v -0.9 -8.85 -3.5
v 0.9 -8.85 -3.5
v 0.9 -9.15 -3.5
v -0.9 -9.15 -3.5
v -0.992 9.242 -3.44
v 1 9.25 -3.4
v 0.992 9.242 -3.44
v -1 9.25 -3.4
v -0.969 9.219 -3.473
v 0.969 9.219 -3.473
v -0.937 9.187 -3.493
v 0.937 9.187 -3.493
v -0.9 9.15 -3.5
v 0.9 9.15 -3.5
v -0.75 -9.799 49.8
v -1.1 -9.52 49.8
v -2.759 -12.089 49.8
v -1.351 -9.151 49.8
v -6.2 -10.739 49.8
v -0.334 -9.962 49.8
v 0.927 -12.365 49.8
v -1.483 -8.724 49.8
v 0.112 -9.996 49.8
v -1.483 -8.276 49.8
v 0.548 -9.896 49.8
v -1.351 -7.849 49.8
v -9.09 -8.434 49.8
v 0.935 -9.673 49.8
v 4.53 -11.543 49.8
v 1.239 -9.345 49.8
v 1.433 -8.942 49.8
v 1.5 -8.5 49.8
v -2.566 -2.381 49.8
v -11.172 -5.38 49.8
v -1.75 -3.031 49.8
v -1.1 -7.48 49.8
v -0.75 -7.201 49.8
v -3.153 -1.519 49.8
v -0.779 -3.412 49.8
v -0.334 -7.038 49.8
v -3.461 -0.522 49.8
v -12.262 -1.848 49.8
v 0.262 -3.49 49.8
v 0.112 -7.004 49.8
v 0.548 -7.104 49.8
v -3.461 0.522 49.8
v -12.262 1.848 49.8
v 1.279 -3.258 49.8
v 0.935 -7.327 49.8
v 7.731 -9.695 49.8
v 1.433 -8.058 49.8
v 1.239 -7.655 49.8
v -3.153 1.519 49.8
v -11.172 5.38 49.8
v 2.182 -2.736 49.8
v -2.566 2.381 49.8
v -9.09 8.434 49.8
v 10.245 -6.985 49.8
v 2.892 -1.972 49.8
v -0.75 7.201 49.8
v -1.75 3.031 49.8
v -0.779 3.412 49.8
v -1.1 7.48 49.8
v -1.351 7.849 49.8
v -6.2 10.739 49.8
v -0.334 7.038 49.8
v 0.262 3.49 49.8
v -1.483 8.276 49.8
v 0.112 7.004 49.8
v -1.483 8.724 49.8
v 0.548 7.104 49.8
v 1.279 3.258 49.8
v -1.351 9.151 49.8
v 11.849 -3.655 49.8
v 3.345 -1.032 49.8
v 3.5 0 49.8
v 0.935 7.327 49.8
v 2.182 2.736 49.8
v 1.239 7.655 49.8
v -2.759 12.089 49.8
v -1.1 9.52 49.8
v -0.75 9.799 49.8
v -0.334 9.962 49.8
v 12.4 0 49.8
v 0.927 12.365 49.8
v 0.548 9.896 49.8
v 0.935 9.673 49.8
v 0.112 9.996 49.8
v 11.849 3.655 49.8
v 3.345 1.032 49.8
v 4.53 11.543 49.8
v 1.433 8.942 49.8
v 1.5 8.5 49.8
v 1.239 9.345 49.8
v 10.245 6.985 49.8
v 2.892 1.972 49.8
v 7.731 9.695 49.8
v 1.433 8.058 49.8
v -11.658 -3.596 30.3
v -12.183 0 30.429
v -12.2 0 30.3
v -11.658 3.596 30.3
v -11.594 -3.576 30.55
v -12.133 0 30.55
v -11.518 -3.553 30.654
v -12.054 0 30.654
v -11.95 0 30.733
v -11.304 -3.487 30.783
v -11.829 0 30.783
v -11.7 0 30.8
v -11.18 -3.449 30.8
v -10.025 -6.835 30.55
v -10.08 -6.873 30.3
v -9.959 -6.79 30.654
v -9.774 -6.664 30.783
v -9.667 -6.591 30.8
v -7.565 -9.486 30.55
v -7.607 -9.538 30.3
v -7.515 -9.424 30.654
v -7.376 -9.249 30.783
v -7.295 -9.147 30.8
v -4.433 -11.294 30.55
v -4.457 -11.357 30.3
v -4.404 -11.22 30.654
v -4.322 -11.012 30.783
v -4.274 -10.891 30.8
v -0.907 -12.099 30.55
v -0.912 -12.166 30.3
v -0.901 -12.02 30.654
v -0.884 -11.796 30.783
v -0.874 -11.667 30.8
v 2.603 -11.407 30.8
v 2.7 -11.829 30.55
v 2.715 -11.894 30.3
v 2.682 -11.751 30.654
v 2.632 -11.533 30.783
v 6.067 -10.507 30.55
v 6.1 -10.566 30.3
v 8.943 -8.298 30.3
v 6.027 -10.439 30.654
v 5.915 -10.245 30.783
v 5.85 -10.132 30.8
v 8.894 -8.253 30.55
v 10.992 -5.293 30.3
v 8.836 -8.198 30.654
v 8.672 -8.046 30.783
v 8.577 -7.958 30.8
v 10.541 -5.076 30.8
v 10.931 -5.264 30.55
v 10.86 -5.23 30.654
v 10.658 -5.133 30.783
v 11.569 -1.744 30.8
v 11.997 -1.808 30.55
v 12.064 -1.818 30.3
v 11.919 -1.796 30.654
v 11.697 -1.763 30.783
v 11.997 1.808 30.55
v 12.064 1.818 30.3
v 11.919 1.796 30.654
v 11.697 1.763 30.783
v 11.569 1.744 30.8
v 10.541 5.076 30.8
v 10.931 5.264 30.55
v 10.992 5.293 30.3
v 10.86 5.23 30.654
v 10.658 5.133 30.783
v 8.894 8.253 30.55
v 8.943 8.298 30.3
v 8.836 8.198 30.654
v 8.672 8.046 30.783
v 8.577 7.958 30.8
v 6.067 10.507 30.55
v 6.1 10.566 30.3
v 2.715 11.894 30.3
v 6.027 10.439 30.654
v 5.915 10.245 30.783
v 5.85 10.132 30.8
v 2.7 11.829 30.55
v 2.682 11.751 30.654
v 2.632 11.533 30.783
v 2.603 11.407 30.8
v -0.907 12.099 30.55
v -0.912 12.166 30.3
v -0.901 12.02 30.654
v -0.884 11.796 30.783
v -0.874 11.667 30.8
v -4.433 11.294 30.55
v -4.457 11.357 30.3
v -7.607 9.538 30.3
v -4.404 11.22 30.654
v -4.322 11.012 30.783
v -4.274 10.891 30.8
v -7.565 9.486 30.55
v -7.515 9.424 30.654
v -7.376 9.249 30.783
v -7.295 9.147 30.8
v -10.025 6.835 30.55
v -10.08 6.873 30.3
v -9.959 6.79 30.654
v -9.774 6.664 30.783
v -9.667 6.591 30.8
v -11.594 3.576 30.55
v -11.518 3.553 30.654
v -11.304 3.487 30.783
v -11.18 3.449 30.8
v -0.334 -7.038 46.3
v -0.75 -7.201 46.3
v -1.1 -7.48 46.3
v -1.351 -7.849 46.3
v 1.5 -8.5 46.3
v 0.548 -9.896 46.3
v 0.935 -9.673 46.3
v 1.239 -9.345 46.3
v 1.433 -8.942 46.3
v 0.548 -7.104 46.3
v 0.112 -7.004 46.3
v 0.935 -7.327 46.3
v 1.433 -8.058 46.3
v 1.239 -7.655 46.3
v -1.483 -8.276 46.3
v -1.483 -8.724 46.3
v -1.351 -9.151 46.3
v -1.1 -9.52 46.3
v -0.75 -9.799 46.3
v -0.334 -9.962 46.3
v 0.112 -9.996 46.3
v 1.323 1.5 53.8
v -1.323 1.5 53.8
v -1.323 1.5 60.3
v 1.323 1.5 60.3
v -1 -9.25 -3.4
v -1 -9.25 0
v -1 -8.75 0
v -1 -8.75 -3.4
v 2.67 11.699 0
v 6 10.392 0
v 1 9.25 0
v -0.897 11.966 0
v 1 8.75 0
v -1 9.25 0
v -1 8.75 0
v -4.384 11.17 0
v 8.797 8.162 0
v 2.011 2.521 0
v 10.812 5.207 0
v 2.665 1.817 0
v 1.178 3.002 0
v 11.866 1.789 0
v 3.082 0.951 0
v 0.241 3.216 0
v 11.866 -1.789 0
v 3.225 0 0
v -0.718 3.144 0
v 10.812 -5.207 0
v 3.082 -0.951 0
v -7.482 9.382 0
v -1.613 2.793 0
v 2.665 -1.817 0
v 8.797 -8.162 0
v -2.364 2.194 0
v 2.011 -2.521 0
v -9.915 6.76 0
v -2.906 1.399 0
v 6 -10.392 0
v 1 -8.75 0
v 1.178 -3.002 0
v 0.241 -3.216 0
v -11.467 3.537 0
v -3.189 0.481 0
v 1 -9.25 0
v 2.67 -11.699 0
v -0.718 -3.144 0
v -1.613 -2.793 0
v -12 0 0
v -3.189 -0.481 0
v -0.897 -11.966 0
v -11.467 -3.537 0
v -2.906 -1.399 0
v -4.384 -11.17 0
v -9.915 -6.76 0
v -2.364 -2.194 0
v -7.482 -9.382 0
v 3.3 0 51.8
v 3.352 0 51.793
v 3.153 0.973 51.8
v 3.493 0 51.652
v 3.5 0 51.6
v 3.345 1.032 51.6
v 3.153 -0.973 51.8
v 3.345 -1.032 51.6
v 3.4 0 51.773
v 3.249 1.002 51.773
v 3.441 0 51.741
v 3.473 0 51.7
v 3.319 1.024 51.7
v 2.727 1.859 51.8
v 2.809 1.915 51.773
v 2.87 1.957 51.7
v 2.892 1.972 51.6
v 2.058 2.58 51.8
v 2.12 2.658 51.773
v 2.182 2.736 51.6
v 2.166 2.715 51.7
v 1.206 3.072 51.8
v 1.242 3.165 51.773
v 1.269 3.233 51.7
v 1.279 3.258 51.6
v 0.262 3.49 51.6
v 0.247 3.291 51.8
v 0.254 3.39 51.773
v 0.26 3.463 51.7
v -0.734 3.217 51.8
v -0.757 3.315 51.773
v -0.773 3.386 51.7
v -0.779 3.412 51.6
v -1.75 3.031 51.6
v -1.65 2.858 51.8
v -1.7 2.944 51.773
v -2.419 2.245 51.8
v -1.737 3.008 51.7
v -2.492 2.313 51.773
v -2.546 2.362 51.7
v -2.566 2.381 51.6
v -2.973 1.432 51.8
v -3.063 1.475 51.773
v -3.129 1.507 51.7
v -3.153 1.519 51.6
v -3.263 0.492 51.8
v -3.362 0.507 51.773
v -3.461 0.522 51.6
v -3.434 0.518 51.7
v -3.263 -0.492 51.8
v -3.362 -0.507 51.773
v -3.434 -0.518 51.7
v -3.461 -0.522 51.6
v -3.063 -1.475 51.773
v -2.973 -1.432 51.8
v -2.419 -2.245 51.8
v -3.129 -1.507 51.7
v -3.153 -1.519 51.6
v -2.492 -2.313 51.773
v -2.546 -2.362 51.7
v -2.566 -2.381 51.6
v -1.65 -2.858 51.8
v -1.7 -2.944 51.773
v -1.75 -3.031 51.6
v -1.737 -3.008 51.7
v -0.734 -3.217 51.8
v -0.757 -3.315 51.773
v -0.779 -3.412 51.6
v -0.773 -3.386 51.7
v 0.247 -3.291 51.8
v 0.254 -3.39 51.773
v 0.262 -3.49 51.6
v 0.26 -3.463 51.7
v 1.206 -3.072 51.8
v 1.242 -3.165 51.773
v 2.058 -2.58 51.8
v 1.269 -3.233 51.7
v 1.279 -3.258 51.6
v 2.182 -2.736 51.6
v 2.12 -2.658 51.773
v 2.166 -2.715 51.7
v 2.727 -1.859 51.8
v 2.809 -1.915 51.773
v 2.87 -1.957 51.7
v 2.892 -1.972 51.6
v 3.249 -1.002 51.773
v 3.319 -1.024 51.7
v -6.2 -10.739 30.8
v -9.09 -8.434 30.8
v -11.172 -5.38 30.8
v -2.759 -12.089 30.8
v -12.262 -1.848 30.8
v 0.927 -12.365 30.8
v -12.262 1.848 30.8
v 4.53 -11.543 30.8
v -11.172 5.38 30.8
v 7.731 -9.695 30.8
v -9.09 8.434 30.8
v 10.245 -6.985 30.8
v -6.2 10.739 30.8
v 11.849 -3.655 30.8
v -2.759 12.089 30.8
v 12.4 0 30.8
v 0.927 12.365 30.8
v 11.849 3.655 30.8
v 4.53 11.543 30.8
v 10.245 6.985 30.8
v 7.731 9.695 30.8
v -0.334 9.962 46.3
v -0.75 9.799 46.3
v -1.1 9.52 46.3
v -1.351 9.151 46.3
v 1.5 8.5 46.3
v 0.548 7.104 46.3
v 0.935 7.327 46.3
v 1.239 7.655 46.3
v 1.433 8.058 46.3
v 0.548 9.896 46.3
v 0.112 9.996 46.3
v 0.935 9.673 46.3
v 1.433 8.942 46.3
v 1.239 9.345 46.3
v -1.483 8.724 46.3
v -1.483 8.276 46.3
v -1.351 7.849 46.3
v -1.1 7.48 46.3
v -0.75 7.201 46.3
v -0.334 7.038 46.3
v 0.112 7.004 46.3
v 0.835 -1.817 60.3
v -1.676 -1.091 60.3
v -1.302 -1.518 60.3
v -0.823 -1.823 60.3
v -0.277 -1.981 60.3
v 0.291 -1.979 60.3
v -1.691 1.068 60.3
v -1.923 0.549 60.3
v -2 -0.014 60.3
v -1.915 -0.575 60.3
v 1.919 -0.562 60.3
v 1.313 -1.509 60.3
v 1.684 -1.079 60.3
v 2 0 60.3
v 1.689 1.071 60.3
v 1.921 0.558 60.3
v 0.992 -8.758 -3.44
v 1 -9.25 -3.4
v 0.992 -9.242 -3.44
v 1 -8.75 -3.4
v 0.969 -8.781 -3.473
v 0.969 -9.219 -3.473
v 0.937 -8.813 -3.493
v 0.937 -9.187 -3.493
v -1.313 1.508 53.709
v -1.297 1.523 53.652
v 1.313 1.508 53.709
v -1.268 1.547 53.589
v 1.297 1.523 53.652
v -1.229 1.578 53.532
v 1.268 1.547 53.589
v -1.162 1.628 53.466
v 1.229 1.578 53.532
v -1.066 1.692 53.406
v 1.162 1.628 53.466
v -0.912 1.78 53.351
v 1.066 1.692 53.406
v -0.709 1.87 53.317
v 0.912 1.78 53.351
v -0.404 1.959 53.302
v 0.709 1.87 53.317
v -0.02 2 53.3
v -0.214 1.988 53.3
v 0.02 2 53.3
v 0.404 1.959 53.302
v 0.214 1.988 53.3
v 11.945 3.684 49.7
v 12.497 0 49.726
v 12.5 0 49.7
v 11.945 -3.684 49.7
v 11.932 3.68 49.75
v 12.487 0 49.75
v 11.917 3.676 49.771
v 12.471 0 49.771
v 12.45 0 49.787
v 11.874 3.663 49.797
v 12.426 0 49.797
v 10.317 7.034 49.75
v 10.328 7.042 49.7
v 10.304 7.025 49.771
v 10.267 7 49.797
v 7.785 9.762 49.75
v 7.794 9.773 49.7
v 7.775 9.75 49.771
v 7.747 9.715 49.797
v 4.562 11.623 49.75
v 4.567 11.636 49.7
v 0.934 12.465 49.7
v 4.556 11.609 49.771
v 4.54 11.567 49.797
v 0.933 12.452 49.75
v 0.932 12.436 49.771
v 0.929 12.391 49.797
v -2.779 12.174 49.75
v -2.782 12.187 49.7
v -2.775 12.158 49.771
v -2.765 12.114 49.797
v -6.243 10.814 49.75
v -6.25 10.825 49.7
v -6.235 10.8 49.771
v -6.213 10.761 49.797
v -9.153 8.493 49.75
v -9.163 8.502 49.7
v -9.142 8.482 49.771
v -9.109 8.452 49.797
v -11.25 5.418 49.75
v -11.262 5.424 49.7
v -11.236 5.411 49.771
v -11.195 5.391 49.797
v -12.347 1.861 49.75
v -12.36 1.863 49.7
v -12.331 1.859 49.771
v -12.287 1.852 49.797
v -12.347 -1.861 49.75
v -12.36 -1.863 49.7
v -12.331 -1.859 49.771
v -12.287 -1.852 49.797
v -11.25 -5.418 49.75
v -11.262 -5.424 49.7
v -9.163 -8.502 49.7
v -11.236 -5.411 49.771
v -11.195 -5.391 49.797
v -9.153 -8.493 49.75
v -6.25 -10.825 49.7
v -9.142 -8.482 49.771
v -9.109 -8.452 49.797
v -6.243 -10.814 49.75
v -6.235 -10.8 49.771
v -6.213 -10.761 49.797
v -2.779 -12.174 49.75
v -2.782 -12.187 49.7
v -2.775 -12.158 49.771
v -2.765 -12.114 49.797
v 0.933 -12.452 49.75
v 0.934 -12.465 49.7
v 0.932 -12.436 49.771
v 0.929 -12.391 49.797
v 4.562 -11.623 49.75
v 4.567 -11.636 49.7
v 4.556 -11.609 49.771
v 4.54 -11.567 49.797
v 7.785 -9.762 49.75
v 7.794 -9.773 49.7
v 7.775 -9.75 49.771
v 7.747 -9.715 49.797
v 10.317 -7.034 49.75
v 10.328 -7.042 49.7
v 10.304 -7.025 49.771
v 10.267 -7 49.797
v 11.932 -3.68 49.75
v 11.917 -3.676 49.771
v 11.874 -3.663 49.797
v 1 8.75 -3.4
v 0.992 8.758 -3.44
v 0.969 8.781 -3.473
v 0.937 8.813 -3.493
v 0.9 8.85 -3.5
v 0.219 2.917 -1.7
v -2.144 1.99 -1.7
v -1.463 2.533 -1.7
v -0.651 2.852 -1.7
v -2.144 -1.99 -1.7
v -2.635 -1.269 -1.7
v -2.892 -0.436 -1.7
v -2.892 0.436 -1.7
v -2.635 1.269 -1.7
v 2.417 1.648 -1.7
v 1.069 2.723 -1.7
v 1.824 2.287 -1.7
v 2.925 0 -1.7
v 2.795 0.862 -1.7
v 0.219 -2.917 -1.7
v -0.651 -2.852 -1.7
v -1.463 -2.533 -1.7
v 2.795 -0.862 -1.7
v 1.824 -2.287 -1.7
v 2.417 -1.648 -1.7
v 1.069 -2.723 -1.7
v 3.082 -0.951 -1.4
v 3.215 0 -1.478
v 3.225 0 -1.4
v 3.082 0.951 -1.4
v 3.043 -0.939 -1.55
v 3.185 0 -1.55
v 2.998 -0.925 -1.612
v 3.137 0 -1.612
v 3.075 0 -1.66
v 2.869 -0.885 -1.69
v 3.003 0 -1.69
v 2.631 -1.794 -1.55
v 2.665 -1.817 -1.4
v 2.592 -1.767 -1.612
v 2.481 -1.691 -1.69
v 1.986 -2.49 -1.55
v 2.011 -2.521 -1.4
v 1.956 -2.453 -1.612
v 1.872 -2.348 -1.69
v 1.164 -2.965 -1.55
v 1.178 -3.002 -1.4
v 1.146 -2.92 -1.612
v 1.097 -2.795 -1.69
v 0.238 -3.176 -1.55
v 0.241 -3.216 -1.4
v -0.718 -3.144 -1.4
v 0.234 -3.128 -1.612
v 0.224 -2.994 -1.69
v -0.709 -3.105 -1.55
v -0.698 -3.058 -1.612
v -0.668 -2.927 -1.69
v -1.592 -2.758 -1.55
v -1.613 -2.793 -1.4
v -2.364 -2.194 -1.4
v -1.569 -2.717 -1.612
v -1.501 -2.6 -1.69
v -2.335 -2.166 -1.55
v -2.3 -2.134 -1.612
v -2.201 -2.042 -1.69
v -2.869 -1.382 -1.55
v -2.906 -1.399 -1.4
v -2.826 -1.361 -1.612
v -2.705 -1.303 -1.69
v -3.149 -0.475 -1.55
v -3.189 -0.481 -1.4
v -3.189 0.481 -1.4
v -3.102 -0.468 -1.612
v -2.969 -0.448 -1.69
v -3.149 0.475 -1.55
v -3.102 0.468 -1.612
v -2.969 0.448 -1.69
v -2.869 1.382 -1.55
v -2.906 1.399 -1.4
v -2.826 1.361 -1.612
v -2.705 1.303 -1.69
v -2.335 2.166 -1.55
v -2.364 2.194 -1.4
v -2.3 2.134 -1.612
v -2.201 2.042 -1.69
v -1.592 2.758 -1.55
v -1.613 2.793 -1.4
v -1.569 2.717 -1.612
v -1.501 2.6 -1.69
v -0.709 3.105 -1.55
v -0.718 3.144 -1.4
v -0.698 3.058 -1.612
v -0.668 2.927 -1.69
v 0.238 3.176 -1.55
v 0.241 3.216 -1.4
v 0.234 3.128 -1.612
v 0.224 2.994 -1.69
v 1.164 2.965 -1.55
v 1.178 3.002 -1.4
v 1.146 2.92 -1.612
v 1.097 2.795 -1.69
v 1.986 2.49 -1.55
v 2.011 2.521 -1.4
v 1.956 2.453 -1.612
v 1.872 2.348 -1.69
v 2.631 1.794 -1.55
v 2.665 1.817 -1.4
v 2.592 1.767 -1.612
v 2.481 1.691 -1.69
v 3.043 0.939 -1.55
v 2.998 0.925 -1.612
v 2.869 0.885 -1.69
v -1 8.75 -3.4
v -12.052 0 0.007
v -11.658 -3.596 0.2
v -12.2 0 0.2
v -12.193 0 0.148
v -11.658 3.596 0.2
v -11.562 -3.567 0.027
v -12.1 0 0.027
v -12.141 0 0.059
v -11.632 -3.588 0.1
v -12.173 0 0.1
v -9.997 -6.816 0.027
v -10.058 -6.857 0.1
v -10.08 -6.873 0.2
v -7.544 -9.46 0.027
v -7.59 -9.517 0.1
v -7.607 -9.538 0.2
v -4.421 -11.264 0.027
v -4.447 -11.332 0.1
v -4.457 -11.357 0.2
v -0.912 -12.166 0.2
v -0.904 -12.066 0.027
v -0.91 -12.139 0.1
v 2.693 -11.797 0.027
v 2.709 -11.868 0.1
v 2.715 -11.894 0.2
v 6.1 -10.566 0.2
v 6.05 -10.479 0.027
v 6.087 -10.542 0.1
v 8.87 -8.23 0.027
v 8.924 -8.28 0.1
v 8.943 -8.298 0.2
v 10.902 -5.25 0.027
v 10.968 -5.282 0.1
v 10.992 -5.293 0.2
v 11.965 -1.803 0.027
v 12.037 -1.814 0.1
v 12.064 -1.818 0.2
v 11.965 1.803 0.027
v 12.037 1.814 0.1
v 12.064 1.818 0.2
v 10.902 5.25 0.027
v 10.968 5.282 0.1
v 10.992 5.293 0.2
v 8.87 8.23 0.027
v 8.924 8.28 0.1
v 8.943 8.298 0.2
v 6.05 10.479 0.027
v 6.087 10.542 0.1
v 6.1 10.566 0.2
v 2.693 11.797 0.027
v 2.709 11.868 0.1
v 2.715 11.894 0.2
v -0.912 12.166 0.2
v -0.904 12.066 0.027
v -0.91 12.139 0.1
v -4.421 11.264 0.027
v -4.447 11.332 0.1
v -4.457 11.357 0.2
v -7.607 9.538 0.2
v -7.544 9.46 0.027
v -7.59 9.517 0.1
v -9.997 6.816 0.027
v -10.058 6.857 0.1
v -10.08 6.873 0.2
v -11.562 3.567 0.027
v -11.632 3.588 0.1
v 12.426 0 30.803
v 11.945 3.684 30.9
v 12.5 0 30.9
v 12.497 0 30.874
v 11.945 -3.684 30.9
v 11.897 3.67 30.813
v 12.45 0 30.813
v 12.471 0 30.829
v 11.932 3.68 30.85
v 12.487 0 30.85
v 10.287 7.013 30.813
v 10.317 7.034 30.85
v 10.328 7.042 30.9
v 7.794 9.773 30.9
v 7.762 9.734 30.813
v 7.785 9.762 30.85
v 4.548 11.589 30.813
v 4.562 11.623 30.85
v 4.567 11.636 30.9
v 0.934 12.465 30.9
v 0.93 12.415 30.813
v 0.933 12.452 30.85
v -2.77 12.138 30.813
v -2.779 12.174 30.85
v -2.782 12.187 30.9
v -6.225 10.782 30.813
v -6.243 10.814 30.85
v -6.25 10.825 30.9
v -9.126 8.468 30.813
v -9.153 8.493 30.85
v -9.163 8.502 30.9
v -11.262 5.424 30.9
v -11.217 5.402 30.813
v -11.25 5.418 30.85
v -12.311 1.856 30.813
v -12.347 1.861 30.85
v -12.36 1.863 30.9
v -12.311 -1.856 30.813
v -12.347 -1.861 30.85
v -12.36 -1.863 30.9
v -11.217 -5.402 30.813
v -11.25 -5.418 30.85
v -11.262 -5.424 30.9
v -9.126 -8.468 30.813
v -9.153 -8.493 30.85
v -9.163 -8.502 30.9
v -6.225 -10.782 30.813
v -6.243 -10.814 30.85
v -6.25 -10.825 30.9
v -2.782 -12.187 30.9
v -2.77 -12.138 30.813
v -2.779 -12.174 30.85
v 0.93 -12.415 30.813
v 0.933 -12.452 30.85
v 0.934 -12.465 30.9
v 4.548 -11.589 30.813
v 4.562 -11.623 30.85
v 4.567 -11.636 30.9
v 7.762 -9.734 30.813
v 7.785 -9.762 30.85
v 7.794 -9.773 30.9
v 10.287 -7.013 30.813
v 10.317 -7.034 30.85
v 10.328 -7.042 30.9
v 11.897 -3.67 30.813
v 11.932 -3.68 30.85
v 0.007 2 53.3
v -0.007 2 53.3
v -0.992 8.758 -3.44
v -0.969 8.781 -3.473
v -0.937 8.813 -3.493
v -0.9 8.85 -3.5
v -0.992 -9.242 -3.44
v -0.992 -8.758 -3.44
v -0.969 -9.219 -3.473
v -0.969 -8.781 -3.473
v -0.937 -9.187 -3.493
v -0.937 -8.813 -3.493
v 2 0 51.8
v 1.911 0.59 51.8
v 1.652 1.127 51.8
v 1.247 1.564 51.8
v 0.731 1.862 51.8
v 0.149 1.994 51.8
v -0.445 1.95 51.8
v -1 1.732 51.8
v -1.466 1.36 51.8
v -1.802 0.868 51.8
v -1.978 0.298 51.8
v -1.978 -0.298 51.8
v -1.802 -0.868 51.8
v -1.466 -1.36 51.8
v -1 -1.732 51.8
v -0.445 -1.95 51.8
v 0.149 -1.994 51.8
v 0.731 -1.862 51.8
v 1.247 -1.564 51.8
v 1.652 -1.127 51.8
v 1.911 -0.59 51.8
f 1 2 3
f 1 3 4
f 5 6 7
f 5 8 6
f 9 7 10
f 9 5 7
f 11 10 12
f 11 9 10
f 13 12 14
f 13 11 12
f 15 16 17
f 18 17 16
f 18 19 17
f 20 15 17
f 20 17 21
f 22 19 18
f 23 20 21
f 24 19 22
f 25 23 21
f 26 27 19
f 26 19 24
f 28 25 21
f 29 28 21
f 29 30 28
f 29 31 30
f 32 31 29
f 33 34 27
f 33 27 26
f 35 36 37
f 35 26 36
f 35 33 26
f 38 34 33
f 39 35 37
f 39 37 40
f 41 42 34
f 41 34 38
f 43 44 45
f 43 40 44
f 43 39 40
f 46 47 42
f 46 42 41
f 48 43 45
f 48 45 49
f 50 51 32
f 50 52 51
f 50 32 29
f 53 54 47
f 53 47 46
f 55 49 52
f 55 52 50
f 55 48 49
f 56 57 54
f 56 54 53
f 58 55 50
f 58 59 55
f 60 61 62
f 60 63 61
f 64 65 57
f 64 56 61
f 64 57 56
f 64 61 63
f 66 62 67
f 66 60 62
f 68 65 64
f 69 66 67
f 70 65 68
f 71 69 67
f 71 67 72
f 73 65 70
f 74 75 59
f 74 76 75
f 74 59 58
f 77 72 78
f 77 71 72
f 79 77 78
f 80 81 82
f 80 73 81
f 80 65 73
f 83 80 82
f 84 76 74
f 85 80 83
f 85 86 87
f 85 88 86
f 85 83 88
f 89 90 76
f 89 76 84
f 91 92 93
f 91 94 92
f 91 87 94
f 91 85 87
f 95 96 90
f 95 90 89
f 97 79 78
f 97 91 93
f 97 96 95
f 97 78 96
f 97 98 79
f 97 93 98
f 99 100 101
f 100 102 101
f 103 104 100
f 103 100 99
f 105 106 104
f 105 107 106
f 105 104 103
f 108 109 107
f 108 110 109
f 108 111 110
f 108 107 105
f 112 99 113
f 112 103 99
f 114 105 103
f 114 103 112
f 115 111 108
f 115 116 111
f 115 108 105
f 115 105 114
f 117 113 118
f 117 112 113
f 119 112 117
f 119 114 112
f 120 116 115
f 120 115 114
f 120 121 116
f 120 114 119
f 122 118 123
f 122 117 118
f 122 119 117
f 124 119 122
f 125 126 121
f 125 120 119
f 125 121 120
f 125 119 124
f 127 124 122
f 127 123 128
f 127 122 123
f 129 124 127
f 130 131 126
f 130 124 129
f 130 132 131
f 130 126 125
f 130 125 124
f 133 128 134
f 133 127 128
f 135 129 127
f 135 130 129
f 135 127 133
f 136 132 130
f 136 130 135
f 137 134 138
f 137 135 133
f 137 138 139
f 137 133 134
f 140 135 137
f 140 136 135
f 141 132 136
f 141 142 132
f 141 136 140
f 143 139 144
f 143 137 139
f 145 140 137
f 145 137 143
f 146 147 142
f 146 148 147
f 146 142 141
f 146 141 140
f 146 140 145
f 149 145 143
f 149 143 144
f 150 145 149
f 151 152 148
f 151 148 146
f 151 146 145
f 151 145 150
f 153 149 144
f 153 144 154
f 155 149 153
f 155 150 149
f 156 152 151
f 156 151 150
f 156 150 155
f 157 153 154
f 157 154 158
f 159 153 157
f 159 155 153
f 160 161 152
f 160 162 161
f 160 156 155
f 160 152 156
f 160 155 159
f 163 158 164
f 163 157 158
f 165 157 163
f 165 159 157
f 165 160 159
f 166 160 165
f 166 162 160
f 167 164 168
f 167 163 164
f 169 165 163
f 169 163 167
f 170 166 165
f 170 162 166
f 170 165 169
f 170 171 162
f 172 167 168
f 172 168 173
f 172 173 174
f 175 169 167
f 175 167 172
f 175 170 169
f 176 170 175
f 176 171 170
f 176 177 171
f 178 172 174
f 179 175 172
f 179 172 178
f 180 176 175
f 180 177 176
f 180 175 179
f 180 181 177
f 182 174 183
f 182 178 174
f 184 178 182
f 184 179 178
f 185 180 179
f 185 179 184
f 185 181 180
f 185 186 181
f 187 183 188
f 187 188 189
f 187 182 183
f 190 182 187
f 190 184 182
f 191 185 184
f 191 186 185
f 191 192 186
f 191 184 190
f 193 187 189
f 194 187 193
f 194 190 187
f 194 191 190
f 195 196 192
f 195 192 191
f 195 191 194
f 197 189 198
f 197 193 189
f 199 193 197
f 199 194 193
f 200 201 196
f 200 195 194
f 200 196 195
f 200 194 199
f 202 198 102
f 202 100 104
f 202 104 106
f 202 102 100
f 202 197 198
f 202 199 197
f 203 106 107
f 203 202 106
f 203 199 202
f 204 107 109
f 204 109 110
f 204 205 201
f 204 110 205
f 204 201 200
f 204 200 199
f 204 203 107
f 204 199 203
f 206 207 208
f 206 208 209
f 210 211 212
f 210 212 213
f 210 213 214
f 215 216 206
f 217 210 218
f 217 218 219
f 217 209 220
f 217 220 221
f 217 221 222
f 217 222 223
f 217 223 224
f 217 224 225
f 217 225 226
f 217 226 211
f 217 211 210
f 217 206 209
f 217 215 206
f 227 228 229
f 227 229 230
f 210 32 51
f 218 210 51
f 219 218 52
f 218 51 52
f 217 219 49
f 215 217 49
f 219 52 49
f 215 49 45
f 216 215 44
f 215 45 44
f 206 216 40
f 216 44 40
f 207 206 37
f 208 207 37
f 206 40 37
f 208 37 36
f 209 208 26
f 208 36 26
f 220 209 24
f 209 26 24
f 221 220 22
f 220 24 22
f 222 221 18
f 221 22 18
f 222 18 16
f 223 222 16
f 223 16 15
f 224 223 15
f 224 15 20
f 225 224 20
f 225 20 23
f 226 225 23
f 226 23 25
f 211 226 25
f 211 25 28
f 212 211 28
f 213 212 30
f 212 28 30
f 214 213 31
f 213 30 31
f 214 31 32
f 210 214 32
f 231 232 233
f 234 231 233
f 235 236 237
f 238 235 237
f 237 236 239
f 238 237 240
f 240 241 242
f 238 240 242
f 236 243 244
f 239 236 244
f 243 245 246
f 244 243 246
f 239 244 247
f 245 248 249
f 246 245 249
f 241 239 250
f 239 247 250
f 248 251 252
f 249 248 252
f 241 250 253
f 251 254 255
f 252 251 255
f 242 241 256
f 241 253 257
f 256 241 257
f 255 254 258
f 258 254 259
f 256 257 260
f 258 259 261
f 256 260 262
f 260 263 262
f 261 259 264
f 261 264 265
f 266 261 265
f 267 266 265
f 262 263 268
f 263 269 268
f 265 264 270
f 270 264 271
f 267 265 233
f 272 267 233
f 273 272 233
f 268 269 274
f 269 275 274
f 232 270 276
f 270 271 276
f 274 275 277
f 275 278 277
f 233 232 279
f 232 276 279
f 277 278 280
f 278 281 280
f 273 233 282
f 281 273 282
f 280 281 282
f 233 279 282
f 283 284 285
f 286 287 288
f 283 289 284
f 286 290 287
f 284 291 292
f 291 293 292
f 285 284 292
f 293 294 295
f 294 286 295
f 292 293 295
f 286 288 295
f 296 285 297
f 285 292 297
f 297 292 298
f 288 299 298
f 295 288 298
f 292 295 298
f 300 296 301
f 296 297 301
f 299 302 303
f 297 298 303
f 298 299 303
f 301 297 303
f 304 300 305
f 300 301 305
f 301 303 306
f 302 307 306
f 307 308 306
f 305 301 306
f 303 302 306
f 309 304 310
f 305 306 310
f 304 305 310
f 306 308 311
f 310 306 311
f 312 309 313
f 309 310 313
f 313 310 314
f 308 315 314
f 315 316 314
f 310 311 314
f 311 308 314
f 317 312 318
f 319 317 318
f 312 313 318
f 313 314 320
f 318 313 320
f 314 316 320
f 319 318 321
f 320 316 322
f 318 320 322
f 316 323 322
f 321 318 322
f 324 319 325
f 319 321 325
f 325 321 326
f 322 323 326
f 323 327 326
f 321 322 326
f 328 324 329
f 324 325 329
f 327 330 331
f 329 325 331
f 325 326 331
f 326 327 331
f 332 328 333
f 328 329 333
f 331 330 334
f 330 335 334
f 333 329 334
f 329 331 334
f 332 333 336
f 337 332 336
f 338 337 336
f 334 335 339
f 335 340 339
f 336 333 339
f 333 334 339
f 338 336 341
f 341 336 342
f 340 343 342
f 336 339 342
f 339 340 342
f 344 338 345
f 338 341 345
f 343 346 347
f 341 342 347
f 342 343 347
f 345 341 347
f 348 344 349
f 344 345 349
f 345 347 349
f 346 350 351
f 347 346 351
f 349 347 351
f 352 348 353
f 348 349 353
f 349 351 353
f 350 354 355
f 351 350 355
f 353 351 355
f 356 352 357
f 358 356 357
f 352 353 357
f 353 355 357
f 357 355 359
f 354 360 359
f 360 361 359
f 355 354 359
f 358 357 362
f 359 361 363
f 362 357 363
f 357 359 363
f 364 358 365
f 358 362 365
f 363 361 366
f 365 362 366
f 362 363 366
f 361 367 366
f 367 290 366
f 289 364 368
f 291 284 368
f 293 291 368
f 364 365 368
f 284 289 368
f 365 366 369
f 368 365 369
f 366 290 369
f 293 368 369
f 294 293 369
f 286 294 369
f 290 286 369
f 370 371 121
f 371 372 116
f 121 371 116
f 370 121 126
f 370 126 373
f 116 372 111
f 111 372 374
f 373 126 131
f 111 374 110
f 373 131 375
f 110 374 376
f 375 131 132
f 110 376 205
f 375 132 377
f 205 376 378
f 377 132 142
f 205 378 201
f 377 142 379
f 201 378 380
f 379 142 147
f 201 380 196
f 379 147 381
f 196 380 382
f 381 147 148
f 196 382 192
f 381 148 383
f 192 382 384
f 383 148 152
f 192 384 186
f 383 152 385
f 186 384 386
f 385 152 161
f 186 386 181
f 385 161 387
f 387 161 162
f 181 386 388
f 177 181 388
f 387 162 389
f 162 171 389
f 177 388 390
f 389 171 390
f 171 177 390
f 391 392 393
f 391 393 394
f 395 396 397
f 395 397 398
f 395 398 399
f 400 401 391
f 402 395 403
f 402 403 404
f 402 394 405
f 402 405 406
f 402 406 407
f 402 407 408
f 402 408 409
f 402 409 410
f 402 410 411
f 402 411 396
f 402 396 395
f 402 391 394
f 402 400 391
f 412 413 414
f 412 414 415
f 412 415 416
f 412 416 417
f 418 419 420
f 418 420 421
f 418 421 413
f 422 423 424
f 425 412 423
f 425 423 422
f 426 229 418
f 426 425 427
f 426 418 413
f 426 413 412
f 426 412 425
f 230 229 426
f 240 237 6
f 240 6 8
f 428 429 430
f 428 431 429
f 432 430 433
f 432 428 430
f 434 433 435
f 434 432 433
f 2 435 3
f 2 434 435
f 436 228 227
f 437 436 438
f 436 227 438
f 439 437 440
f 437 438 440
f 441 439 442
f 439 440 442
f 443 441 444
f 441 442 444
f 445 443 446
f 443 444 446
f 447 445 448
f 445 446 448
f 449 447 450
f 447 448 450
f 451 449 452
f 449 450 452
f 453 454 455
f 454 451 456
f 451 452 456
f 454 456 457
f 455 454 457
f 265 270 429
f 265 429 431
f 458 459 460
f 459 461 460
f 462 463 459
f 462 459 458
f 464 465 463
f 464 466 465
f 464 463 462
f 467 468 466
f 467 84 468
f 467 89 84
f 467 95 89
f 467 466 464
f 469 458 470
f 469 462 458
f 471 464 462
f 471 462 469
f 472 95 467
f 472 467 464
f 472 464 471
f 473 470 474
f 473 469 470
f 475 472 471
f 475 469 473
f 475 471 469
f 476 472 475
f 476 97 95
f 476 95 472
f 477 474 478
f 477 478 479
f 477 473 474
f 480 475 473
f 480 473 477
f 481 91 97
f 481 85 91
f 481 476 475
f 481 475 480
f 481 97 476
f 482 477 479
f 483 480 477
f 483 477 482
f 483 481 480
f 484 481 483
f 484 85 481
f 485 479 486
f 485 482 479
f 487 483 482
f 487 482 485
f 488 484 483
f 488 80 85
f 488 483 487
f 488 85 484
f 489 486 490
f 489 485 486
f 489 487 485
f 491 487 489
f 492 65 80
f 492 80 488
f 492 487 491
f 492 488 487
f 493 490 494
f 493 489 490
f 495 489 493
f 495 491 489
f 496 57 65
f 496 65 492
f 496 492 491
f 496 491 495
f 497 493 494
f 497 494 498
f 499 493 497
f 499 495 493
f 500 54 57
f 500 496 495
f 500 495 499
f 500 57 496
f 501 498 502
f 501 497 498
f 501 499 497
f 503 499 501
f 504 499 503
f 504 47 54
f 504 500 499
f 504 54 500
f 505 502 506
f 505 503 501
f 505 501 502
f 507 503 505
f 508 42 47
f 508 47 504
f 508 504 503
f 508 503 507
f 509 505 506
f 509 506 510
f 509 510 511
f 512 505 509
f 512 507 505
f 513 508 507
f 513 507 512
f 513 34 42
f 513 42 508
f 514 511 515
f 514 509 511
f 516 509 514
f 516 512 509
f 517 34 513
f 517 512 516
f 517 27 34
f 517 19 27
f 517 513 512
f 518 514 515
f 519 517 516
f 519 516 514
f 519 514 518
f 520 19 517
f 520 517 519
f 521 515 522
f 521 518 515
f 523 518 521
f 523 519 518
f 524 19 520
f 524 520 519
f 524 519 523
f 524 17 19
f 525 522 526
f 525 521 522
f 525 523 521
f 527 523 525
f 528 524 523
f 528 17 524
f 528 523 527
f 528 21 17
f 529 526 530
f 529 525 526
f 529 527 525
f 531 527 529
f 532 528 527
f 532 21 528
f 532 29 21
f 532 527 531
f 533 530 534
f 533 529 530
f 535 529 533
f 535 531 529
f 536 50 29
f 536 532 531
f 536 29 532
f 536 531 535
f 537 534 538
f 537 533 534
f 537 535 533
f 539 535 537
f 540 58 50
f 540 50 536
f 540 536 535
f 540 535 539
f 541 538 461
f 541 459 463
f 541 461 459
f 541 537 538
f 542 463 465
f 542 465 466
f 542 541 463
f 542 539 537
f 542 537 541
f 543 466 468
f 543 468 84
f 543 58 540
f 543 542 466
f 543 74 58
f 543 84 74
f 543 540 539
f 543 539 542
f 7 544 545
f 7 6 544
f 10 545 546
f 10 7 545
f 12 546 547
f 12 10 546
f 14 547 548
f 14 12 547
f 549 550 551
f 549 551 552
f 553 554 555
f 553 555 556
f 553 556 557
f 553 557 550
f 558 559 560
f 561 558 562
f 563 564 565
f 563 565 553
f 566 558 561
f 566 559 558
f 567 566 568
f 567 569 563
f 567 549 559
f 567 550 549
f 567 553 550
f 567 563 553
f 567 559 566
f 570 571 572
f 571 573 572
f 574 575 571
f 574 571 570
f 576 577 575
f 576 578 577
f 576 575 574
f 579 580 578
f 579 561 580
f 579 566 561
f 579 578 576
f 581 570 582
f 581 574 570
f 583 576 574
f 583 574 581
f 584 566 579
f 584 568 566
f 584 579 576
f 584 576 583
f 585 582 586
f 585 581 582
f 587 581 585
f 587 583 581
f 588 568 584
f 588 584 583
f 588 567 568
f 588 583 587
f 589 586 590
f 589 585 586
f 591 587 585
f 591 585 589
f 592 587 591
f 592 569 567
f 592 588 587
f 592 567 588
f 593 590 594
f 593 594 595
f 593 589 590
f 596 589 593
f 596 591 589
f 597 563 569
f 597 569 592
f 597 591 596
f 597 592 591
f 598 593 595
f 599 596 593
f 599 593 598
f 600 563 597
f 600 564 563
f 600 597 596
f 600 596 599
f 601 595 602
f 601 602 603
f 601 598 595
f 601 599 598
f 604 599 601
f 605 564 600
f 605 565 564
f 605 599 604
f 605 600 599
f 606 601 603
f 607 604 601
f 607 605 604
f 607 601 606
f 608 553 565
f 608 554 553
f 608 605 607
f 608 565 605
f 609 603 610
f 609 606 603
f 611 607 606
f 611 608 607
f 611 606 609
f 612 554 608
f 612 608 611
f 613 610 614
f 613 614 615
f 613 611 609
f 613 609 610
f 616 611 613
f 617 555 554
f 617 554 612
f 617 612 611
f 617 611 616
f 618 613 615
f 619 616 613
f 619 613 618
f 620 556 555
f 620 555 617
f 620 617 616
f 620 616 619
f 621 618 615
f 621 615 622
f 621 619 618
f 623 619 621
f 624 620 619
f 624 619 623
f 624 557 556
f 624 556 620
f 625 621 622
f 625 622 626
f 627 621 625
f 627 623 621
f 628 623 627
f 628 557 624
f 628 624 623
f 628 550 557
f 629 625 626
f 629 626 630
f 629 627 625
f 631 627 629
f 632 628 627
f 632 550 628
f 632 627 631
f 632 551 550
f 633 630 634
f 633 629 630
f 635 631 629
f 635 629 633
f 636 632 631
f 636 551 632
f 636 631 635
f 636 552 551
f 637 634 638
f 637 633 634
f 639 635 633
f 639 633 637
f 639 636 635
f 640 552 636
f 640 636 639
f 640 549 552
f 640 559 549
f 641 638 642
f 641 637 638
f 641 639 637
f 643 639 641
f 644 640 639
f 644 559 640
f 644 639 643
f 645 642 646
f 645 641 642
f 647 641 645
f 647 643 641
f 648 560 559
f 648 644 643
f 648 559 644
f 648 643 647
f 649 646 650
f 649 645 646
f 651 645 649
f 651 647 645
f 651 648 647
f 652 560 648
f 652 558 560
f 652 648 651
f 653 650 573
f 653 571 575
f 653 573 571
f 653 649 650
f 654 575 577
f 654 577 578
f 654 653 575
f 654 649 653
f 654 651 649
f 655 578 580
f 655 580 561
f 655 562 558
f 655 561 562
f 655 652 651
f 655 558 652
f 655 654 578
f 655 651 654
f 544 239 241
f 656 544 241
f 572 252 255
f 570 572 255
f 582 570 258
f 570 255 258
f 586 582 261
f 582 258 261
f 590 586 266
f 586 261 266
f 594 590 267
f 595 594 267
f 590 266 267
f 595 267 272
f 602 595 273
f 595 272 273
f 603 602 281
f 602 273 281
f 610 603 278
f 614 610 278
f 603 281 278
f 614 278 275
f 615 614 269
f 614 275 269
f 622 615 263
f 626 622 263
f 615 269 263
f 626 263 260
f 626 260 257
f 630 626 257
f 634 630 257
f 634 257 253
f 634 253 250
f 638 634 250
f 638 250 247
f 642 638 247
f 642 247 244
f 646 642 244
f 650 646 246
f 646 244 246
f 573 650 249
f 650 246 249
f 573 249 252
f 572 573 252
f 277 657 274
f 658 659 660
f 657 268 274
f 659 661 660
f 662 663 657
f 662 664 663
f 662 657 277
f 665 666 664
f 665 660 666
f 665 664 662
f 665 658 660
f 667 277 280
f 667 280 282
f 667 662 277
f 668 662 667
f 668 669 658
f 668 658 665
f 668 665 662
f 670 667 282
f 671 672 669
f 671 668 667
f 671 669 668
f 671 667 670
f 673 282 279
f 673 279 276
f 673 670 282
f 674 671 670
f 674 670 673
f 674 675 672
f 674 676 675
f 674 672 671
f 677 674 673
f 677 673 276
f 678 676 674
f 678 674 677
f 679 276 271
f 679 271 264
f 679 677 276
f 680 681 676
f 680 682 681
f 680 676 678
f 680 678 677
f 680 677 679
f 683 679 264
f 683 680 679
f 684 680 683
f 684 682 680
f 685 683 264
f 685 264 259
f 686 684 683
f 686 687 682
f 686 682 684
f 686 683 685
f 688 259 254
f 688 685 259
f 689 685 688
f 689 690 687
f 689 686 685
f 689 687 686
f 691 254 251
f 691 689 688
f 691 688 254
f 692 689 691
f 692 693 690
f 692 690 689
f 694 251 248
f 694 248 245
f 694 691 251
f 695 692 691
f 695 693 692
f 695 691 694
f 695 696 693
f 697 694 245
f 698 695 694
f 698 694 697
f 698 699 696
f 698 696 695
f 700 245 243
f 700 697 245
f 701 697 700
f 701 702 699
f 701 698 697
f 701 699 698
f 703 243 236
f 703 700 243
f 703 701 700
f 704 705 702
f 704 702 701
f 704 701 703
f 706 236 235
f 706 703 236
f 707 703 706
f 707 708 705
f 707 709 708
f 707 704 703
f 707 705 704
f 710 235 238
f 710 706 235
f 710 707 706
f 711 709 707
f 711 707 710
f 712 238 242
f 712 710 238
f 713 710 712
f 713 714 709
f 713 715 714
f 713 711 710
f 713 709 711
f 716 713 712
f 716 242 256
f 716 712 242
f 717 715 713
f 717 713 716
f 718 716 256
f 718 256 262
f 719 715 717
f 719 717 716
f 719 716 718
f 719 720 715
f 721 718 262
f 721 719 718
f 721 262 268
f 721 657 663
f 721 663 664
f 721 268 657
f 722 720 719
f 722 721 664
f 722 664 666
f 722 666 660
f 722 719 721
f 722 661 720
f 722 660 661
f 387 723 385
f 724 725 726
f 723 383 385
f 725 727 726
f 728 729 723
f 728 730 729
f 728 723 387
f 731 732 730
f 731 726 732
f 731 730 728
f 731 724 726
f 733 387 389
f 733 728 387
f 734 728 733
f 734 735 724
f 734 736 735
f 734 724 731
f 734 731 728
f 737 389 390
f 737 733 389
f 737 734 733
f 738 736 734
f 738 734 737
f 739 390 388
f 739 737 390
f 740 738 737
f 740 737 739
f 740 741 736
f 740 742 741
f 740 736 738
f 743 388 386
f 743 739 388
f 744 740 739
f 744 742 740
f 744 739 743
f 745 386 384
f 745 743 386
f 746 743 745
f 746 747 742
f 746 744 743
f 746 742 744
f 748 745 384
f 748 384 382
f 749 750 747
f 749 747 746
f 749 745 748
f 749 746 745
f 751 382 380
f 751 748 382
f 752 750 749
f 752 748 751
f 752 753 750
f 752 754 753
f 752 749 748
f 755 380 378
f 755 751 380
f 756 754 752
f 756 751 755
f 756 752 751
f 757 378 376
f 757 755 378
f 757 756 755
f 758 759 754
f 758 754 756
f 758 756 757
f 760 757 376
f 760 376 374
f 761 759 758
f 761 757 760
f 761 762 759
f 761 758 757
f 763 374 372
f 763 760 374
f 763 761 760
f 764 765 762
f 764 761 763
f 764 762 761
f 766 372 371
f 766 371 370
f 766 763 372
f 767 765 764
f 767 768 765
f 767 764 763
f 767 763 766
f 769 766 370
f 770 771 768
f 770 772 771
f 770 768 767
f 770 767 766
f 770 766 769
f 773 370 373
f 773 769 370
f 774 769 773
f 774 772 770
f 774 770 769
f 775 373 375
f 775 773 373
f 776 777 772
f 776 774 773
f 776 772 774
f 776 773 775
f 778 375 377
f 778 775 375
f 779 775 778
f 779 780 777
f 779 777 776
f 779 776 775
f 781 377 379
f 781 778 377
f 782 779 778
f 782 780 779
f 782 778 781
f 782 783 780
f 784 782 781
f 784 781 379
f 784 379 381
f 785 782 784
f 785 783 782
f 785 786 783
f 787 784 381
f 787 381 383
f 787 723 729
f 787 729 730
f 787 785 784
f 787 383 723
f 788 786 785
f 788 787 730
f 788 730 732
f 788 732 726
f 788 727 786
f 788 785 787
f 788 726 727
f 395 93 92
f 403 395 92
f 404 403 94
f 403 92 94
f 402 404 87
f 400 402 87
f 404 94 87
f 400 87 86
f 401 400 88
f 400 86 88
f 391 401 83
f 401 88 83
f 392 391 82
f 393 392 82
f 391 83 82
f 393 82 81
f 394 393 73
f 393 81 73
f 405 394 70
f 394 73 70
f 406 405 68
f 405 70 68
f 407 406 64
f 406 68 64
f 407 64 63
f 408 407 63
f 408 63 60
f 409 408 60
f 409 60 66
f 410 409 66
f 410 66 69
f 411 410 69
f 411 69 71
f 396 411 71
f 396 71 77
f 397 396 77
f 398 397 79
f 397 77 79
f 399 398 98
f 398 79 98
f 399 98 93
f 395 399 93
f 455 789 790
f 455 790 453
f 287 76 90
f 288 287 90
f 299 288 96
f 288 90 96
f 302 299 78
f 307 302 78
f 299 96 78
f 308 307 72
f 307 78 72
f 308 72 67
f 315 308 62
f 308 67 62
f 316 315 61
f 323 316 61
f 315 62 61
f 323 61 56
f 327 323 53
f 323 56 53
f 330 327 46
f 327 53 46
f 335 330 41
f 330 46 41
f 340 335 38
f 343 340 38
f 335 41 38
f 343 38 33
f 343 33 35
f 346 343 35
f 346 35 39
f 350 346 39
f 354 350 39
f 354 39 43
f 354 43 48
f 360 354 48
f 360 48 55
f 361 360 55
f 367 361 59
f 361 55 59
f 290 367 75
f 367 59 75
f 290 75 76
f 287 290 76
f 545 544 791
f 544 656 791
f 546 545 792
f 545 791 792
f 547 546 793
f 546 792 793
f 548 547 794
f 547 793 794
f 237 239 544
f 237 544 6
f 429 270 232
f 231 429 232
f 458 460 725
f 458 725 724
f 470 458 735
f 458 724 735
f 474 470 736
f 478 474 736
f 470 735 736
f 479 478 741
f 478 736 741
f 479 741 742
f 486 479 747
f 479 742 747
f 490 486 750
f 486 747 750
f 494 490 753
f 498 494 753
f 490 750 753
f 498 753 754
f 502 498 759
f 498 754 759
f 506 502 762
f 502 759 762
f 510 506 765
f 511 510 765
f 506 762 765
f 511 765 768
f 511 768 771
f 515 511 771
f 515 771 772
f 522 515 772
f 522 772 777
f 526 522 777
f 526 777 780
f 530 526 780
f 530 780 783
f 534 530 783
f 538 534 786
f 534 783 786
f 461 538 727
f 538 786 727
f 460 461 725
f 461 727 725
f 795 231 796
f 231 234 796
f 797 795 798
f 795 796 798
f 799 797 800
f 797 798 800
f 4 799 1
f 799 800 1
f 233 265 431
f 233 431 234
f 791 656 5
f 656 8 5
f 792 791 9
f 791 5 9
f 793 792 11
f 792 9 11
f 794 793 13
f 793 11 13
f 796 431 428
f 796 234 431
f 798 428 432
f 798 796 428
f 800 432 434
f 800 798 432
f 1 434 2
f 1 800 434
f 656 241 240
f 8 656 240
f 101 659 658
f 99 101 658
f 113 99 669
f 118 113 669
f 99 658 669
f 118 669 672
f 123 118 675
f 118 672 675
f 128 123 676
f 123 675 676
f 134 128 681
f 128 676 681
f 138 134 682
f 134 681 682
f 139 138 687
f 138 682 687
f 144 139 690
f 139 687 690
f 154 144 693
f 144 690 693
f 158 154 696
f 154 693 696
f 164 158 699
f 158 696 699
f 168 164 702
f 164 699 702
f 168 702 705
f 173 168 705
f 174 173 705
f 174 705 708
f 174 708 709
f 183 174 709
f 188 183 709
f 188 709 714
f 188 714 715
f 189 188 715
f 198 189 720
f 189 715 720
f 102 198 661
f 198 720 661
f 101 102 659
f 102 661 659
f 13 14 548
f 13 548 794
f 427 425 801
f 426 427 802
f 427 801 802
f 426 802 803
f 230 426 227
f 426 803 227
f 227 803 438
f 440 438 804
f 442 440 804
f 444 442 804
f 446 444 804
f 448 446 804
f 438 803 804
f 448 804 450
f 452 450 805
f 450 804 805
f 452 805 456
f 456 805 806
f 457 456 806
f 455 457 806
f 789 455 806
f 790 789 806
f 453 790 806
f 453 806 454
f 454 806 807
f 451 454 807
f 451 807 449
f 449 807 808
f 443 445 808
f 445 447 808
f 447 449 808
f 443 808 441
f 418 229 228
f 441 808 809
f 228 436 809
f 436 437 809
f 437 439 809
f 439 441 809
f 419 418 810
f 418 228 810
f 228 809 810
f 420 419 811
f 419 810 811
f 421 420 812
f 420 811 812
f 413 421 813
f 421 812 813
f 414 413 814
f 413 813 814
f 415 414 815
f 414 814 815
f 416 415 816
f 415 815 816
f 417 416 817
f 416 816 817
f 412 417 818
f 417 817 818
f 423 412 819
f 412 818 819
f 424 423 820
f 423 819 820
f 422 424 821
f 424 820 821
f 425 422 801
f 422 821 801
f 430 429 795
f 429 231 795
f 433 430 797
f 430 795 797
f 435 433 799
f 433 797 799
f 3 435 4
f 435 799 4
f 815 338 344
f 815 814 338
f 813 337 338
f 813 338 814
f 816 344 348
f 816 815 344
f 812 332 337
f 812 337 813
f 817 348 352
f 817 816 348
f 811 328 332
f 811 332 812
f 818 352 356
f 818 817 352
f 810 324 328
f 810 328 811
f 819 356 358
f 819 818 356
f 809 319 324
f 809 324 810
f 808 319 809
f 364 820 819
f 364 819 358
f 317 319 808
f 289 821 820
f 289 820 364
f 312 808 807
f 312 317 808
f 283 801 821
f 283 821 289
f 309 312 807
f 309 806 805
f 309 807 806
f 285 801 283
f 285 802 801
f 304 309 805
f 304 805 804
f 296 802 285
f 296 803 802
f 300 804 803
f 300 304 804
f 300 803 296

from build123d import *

# Parameters (mm, degrees)
IZIM2_R                     = 12.2
Y_KSEKLIK_EKSTR_ZYON1_DEPTH = 30.8
RADYUS1_R                   = 0.5
IZIM3_R                     = 12.5
Y_KSEKLIK_EKSTR_ZYON2_DEPTH = 19
IZIM4_R                     = 3.5
Y_KSEKLIK_EKSTR_ZYON3_DEPTH = 2
IZIM5_R                     = 3.225
Y_KSEKLIK_EKSTR_ZYON4_DEPTH = 1.7
IZIM6_R                     = 2
Y_KSEKLIK_EKSTR_ZYON5_DEPTH = 8.5
KES_EKSTR_ZYON1_START       = -7
KES_EKSTR_ZYON1_DEPTH       = 7
RADYUS2_R                   = 0.5
RADYUS3_R                   = 0.2
RADYUS4_R                   = 0.3
RADYUS5_R                   = 0.2
RADYUS6_R                   = 0.1
RADYUS7_R                   = 0.1
IZIM8_R                     = 1.5
KES_EKSTR_ZYON2_DEPTH       = 3.5
IZIM9_W                     = 2
IZIM9_H                     = 0.5
Y_KSEKLIK_EKSTR_ZYON8_DEPTH = 3.5
RADYUS8_R                   = 0.1


with BuildPart() as part:
    # Çizim2 → Yükseklik-Ekstrüzyon1 (new body)
    with BuildSketch(Plane.XY):
        with Locations(Location((0, 0, 0), (0, 0, 180))):
            Circle(IZIM2_R)
    extrude(amount=Y_KSEKLIK_EKSTR_ZYON1_DEPTH)

    # Radyus1
    radyus1_edges = [part.edges().sort_by_distance(p)[0] for p in [
        (12.2, 0, 30.8),
    ]]
    fillet(radyus1_edges, radius=RADYUS1_R)

    # Çizim3 → Yükseklik-Ekstrüzyon2 (add)
    with BuildSketch(Plane.XY.offset(30.8)):
        Circle(IZIM3_R)
    extrude(amount=Y_KSEKLIK_EKSTR_ZYON2_DEPTH)

    # Çizim4 → Yükseklik-Ekstrüzyon3 (add)
    with BuildSketch(Plane.XY.offset(49.8)):
        Circle(IZIM4_R)
    extrude(amount=Y_KSEKLIK_EKSTR_ZYON3_DEPTH)

    # Çizim5 → Yükseklik-Ekstrüzyon4 (add)
    with BuildSketch(Plane(origin=(0, 0, 0), x_dir=(-1, 0, 0), z_dir=(0, 0, -1))):
        with Locations(Location((0, 0, 0), (0, 0, 180))):
            Circle(IZIM5_R)
    extrude(amount=Y_KSEKLIK_EKSTR_ZYON4_DEPTH)

    # Çizim6 → Yükseklik-Ekstrüzyon5 (add)
    with BuildSketch(Plane.XY.offset(51.8)):
        Circle(IZIM6_R)
    extrude(amount=Y_KSEKLIK_EKSTR_ZYON5_DEPTH)

    # Çizim7 → Kes-Ekstrüzyon1 (cut)
    with BuildSketch(Plane.XY.offset(60.3).offset(KES_EKSTR_ZYON1_START)):
        with BuildLine():
            Line((-1.322875656, 1.5), (1.322875656, 1.5))
            ThreePointArc((1.322875656, 1.5), (0, 2), (-1.322875656, 1.5))
        make_face()
    extrude(amount=KES_EKSTR_ZYON1_DEPTH, mode=Mode.SUBTRACT)

    # Radyus2
    radyus2_edges = [part.edges().sort_by_distance(p)[0] for p in [
        (0, 1.5, 53.3),
    ]]
    fillet(radyus2_edges, radius=RADYUS2_R - 0.0001)  # a hair under: the kernel refuses the full size

    # Radyus3
    radyus3_edges = [part.edges().sort_by_distance(p)[0] for p in [
        (-3.5, 0, 51.8),
    ]]
    fillet(radyus3_edges, radius=RADYUS3_R)

    # Radyus4
    radyus4_edges = [part.edges().sort_by_distance(p)[0] for p in [
        (-3.225, 0, -1.7),
    ]]
    fillet(radyus4_edges, radius=RADYUS4_R)

    # Radyus5
    radyus5_edges = [part.edges().sort_by_distance(p)[0] for p in [
        (12.2, 0, 0),
    ]]
    fillet(radyus5_edges, radius=RADYUS5_R)

    # Radyus6
    radyus6_edges = [part.edges().sort_by_distance(p)[0] for p in [
        (-12.5, 0, 30.8),
    ]]
    fillet(radyus6_edges, radius=RADYUS6_R)

    # Radyus7
    radyus7_edges = [part.edges().sort_by_distance(p)[0] for p in [
        (-12.5, 0, 49.8),
    ]]
    fillet(radyus7_edges, radius=RADYUS7_R)

    # Çizim8 → Kes-Ekstrüzyon2 (cut)
    with BuildSketch(Plane.XY.offset(49.8)):
        with Locations((0, 8.5)):
            Circle(IZIM8_R)
        with Locations((0, -8.5)):
            Circle(IZIM8_R)
    extrude(amount=-KES_EKSTR_ZYON2_DEPTH, mode=Mode.SUBTRACT)

    # Çizim9 → Yükseklik-Ekstrüzyon8 (add)
    with BuildSketch(Plane(origin=(0, 0, 0), x_dir=(-1, 0, 0), z_dir=(0, 0, -1))):
        with Locations((0, 9)):
            Rectangle(IZIM9_W, IZIM9_H)
        with Locations((0, -9)):
            Rectangle(IZIM9_W, IZIM9_H)
    extrude(amount=Y_KSEKLIK_EKSTR_ZYON8_DEPTH)

    # Radyus8
    radyus8_edges = [part.edges().sort_by_distance(p)[0] for p in [
        (1, 9, -3.5),
        (0, 8.75, -3.5),
        (-1, 9, -3.5),
        (0, 9.25, -3.5),
        (1, -9, -3.5),
        (0, -9.25, -3.5),
        (-1, -9, -3.5),
        (0, -8.75, -3.5),
    ]]
    fillet(radyus8_edges, radius=RADYUS8_R)


solid = part.part
